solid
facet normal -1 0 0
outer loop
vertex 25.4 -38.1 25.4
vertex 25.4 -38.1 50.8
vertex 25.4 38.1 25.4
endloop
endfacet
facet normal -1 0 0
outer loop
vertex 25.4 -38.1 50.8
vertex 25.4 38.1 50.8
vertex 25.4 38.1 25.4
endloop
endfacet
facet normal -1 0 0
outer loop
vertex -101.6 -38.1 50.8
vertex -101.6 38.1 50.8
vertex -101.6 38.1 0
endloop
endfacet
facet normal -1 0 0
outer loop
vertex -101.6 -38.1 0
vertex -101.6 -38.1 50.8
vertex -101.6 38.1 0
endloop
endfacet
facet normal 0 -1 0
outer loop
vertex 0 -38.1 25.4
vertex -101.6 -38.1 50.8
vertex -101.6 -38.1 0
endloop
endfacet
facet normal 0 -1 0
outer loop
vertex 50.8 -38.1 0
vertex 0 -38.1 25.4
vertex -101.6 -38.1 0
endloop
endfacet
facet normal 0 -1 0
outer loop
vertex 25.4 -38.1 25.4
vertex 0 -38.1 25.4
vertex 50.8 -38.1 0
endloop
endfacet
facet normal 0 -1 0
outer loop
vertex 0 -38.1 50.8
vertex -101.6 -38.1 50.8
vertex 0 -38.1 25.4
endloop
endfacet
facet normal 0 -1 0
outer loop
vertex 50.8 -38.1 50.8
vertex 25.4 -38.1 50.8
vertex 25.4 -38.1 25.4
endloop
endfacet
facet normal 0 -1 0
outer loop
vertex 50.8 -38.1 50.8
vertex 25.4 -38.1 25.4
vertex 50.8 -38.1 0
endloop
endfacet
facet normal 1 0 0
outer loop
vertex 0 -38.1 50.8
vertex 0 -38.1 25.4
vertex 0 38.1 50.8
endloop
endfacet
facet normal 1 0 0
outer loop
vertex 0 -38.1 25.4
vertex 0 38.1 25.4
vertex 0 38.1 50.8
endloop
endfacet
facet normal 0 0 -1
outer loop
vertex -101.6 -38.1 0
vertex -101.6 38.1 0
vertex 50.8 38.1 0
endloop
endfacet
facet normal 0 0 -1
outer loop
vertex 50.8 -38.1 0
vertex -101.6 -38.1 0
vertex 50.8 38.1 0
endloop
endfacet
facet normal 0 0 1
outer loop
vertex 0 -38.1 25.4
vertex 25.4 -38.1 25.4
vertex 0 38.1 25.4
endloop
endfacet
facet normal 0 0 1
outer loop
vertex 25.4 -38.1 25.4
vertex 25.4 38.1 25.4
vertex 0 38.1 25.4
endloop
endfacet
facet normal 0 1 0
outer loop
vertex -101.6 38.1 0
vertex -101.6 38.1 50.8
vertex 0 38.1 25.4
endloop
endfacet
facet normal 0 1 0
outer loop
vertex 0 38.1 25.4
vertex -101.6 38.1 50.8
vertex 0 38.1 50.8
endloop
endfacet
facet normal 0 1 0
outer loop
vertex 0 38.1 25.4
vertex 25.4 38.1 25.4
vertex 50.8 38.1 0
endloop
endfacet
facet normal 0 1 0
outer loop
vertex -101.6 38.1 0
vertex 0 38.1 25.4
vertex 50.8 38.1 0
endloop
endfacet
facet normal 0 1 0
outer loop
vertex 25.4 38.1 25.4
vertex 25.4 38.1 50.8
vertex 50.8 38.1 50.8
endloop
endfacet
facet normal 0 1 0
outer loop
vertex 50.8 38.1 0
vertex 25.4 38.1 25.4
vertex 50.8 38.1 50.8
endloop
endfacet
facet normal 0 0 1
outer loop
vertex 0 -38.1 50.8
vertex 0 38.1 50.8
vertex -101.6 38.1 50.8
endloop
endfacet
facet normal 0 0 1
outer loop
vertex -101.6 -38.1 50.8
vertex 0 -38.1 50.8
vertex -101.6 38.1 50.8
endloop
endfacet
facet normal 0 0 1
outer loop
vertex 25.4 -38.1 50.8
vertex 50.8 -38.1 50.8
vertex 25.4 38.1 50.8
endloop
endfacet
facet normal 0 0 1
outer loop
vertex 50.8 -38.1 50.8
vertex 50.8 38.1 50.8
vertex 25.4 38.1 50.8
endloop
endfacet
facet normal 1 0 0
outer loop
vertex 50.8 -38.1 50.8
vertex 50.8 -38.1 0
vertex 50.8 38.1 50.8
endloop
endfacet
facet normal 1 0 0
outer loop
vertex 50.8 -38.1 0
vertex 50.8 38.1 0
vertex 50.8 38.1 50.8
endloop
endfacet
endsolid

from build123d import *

# Parameters (mm, degrees)
F1_DEPTH = 38.1
F2_DEPTH = 38.1


with BuildPart() as f1:
    # F0 (on Front) → F1 (new body)
    with BuildSketch(Plane.XZ):
        Polygon((-101.6, 50.8), (-101.6, 0), (50.8, 0), (50.8, 50.8), (25.4, 50.8), (25.4, 25.4), (0, 25.4), (0, 50.8), align=None)
    extrude(amount=-F1_DEPTH)

    # F1_face (on face) → F2 (join)
    with BuildSketch(Plane(origin=(-28.863636, 0, 24.245455), x_dir=(1, 0, 0), z_dir=(0, -1, 0))):
        Polygon((-72.736364, -24.245455), (79.663636, -24.245455), (79.663636, 26.554545), (54.263636, 26.554545), (54.263636, 1.154545), (28.863636, 1.154545), (28.863636, 26.554545), (-72.736364, 26.554545), align=None)
    extrude(amount=F2_DEPTH)


solid = f1.part
